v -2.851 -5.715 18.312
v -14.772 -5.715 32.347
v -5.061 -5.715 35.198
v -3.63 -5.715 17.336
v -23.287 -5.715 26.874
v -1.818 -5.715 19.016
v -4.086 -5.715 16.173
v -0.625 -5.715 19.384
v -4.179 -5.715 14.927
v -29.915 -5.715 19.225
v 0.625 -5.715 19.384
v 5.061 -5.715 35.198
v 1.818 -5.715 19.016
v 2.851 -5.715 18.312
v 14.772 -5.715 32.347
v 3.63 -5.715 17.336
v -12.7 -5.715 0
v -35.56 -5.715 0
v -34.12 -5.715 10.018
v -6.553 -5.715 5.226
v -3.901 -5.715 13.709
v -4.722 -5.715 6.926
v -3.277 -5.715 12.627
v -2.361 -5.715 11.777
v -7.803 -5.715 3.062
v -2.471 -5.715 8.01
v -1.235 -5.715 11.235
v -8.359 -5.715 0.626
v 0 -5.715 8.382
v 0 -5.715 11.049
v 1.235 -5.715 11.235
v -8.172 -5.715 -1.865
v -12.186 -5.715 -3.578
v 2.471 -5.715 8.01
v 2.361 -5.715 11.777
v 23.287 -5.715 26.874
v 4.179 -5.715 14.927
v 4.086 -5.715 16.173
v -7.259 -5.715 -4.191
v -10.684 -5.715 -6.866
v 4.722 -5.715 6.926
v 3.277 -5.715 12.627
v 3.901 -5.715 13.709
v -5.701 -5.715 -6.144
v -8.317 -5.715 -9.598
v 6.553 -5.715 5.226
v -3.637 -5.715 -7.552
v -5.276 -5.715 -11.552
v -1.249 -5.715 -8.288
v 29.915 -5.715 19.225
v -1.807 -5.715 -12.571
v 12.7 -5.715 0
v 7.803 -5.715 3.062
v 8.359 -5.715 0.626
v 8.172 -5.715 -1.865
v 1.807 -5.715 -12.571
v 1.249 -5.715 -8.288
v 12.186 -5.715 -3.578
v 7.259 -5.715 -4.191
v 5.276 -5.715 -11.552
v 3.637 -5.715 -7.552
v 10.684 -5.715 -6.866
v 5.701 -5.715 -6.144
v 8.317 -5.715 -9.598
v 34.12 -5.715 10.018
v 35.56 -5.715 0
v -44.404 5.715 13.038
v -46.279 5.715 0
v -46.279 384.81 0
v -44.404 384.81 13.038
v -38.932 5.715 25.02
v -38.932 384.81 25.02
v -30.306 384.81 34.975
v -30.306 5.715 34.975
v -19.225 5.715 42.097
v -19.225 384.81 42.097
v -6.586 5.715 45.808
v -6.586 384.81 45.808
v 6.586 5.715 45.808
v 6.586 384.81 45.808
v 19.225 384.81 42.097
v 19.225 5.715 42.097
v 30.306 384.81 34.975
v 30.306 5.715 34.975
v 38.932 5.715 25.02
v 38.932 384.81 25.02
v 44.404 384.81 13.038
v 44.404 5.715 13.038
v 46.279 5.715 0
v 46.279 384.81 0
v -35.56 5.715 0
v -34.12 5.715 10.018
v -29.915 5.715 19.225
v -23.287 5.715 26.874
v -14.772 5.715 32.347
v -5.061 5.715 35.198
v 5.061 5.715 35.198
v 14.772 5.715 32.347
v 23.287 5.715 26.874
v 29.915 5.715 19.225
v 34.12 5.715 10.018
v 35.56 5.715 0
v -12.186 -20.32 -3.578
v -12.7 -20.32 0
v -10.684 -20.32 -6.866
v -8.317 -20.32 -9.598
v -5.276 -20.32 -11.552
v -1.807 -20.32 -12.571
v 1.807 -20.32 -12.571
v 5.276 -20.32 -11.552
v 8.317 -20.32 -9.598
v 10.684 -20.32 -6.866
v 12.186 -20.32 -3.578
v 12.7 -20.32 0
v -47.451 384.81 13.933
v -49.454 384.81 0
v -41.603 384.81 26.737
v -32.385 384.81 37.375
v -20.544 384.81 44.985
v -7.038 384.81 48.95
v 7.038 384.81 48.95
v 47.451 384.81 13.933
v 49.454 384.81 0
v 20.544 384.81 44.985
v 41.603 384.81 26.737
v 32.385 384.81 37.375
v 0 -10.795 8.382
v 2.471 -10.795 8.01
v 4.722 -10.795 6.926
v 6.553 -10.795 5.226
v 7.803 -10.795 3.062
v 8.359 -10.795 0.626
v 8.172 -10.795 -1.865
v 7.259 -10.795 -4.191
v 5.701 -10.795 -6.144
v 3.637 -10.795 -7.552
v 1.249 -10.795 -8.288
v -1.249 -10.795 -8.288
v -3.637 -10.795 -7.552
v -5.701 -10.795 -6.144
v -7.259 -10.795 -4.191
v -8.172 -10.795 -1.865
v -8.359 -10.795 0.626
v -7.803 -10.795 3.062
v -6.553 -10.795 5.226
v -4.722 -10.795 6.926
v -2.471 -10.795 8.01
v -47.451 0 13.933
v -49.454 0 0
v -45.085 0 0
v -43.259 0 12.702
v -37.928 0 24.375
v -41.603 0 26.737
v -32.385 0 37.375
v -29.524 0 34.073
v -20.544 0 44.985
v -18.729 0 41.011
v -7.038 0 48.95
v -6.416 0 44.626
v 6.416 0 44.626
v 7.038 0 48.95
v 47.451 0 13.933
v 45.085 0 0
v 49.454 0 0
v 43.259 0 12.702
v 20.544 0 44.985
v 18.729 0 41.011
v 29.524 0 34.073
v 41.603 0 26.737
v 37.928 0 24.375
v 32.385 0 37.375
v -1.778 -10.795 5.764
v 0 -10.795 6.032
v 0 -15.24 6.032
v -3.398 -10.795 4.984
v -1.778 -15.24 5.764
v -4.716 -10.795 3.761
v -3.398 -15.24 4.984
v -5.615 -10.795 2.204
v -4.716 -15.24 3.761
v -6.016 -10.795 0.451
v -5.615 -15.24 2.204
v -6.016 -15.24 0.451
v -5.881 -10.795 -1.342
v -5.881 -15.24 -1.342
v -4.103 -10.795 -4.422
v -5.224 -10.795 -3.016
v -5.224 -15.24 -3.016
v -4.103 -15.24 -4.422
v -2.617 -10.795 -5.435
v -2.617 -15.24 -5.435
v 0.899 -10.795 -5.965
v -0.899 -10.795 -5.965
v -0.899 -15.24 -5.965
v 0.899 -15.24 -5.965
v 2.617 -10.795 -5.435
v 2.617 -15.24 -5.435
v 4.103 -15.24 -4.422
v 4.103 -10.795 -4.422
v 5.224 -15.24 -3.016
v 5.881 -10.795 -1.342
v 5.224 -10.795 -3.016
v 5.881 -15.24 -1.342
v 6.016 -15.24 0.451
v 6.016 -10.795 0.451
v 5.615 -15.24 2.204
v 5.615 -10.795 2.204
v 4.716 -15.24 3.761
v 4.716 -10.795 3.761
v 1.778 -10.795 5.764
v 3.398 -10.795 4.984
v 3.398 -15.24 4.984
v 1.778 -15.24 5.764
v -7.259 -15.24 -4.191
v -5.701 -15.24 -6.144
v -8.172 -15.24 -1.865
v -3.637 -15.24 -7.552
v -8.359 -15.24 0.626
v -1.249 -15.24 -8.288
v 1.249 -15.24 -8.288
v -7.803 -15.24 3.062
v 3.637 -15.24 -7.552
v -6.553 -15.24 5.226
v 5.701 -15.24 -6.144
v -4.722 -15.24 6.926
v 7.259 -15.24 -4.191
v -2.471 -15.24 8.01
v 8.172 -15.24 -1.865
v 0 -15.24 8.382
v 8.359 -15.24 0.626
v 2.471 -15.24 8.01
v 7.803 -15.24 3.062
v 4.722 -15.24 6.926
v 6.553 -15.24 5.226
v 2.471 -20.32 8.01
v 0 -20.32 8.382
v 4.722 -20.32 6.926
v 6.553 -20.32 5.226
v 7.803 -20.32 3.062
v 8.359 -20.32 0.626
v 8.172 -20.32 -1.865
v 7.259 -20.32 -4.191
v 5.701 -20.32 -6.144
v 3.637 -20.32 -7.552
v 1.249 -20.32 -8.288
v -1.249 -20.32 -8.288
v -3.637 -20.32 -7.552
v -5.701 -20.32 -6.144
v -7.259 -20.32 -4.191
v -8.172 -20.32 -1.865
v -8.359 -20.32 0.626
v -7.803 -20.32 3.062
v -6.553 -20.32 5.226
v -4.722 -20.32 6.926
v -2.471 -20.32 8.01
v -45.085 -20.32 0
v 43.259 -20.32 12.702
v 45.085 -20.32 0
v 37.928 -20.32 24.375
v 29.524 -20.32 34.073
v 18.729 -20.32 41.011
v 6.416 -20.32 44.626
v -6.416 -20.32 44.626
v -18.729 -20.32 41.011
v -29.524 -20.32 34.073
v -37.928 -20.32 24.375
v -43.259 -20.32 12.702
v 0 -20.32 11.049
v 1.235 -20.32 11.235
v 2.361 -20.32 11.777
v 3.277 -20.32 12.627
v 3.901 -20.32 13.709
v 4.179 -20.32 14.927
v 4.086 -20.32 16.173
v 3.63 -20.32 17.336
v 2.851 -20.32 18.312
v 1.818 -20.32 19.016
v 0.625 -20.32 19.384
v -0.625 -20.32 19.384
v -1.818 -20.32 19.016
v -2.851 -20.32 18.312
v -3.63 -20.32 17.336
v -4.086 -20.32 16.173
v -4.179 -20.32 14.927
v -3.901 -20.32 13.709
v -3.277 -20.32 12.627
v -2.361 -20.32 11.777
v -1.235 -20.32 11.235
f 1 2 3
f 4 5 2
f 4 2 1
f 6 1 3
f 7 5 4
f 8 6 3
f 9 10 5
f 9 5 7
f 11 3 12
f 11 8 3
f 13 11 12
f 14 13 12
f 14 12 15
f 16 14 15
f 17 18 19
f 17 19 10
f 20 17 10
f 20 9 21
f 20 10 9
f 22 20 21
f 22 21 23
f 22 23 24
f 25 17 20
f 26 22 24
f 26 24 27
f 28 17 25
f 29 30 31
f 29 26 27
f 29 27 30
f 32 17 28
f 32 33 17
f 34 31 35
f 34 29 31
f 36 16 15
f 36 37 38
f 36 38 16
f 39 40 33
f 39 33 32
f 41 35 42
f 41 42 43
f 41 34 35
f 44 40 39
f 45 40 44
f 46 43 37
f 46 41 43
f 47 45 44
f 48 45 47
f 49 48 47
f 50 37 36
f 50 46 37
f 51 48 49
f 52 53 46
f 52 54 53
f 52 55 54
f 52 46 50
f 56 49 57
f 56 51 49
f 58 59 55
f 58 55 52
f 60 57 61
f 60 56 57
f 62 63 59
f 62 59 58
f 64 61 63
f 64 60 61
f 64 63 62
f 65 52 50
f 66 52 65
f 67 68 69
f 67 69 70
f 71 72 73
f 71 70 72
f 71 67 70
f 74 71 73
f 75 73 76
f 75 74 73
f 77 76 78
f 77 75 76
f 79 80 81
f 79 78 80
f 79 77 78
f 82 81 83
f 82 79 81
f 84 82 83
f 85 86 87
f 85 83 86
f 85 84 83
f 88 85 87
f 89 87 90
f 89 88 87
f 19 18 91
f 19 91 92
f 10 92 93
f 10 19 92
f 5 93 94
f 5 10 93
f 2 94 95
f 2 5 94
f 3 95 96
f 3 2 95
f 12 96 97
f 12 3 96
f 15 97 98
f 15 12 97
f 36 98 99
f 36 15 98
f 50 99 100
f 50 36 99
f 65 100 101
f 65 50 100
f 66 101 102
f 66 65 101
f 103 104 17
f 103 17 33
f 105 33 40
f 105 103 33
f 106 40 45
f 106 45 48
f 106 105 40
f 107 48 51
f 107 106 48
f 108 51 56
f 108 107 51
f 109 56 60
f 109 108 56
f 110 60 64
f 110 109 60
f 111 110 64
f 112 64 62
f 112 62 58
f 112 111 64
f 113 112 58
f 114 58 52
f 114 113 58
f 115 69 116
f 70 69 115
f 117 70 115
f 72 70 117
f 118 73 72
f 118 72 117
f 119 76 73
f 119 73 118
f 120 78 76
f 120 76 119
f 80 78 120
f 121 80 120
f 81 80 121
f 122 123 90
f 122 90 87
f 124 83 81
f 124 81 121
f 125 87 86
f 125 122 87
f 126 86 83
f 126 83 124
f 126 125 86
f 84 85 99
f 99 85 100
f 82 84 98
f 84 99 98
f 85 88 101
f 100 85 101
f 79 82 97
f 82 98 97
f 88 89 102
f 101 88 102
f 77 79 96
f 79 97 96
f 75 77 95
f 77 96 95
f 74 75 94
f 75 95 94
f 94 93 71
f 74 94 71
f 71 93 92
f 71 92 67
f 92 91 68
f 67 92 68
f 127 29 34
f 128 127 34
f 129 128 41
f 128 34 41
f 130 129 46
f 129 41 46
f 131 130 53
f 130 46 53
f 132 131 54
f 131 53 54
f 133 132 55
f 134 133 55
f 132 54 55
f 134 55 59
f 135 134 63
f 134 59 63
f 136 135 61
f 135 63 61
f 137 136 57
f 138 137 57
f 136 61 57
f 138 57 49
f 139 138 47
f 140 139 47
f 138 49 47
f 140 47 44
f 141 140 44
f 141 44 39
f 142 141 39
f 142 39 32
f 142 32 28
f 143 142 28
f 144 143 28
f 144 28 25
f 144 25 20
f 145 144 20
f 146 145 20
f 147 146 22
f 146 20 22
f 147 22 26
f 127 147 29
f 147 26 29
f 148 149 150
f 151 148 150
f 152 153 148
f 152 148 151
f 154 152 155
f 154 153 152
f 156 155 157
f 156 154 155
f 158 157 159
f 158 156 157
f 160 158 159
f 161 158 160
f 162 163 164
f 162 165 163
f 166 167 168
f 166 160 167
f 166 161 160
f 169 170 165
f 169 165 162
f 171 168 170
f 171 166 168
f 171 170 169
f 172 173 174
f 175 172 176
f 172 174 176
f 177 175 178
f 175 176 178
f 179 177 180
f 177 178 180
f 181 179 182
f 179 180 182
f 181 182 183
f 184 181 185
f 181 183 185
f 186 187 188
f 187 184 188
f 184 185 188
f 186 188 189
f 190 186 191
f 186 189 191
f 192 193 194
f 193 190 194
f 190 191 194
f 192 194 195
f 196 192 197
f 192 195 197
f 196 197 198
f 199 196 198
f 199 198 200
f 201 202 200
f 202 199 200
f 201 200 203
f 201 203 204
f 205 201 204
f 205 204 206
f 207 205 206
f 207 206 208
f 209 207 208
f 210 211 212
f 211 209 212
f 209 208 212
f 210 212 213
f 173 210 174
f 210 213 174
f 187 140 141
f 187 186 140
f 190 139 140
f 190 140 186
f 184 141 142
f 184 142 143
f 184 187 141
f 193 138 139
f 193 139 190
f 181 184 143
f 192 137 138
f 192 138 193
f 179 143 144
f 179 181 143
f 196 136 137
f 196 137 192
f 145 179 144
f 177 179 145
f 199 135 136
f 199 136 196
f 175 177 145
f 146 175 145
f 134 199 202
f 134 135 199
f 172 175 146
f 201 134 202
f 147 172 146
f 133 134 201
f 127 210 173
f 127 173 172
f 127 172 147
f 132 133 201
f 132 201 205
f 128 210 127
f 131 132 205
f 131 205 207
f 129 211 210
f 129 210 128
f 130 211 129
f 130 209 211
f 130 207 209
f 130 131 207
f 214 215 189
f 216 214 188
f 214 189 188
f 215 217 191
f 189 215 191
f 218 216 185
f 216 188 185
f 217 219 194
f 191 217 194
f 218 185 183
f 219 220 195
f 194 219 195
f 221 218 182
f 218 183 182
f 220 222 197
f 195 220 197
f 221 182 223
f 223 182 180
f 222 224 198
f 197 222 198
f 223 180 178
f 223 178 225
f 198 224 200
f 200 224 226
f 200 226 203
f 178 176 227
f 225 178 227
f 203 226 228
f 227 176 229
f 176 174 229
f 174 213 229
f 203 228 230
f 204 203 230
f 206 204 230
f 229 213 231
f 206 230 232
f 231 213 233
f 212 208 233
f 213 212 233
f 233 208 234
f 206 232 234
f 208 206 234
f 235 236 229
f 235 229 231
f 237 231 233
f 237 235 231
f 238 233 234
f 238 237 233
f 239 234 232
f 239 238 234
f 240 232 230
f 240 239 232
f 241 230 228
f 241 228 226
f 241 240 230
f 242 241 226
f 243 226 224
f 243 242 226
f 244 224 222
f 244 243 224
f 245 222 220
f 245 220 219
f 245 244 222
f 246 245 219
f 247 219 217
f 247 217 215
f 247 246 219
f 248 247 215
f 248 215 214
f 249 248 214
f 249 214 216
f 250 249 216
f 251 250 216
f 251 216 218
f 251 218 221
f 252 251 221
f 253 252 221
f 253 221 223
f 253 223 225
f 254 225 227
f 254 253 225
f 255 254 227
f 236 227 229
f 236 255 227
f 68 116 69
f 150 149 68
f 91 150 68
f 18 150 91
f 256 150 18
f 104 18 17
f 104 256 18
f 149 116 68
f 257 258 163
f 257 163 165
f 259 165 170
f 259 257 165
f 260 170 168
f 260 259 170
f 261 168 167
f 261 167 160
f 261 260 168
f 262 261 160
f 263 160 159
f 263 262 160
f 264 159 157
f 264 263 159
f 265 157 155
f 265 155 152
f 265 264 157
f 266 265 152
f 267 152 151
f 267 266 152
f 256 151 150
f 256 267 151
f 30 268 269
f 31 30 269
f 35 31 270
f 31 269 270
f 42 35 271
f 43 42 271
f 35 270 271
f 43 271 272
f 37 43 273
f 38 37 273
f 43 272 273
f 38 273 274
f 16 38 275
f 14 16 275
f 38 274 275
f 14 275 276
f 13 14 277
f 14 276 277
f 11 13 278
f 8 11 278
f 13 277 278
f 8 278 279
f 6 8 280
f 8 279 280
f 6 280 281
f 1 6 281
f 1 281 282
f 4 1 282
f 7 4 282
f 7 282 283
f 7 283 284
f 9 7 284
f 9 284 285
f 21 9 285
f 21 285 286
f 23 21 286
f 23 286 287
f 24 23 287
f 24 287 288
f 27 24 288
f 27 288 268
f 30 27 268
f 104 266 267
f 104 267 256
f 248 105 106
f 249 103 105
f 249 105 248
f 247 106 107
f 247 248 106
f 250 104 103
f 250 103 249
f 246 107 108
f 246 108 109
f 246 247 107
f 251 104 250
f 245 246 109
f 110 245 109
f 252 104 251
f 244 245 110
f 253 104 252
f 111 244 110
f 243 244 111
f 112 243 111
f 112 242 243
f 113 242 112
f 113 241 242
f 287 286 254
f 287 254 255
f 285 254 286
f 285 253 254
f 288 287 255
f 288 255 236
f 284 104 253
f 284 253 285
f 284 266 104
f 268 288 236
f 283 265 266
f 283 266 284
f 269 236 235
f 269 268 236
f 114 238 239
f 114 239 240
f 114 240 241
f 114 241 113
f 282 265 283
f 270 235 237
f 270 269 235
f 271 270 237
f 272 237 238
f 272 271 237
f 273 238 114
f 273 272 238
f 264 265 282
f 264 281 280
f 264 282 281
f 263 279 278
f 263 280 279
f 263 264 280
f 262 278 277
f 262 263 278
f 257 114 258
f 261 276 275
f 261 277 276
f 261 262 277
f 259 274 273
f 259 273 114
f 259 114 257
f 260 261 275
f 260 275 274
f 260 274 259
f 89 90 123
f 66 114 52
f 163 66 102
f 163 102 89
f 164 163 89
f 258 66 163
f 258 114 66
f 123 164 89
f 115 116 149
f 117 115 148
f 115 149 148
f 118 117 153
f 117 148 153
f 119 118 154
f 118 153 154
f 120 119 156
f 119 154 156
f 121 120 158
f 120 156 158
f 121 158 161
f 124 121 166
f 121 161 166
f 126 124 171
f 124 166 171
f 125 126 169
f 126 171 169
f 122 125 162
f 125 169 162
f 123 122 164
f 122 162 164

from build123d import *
from build123d.topology import SkipClean

# Parameters (mm, degrees)
BOSS_EXTRUDE1_DEPTH      = 3.81
BOSS_EXTRUDE1_DEPTH_BACK = 6.35
SKETCH1_R                = 49.4538
SKETCH2_R                = 49.4538
BOSS_EXTRUDE2_DEPTH      = 381
SHELL1_T                 = -3.175
CUT_EXTRUDE1_DEPTH       = 398.363186857
BOSS_EXTRUDE3_DEPTH      = 3.81
SKETCH7_R                = 49.4538
SKETCH7_R_2              = 45.085
CUT_EXTRUDE2_DEPTH       = 6.35
BOSS_EXTRUDE4_START      = 7.62
BOSS_EXTRUDE4_DEPTH      = 7.62
SKETCH10_R               = 35.56
CUT_EXTRUDE3_DEPTH       = 6.35
SKETCH11_R               = 8.382
CUT_EXTRUDE4_DEPTH       = 5.08
SKETCH12_R               = 6.0325
CUT_EXTRUDE5_DEPTH       = 402.739558289
BOSS_EXTRUDE5_DEPTH      = 5.08
SKETCH14_R               = 4.191
CUT_EXTRUDE6_DEPTH       = 405.866453376
BOSS_EXTRUDE6_START      = 6.35
SKETCH15_R               = 4.191
SKETCH15_R_2             = 6.0325
BOSS_EXTRUDE6_DEPTH      = 6.35


with BuildPart() as part:
    # Sketch1 → Boss-Extrude1 (new, two sides: drawn at the far end of the back side and taken through both)
    with BuildSketch(Plane(origin=(0, 0, 0), x_dir=(1, 0, 0), z_dir=(0, 1, 0)).offset(-BOSS_EXTRUDE1_DEPTH_BACK)):
        Circle(SKETCH1_R)
    extrude(amount=BOSS_EXTRUDE1_DEPTH + BOSS_EXTRUDE1_DEPTH_BACK)

    # Sketch2 → Boss-Extrude2 (add)
    with BuildSketch(Plane(origin=(0, 3.81, 0), x_dir=(1, 0, 0), z_dir=(0, 1, 0))):
        Circle(SKETCH2_R)
    extrude(amount=BOSS_EXTRUDE2_DEPTH)

    # Shell1
    shell1_openings = [part.faces().sort_by_distance(p)[0] for p in [
        (0, 384.81, 0),
    ]]
    offset(amount=SHELL1_T, openings=shell1_openings, kind=Kind.INTERSECTION)

    # Sketch4 → Cut-Extrude1 (cut, through all)
    with BuildSketch(Plane.XZ.offset(6.35)):
        with BuildLine():
            Line((49.4538, 0), (12.7, 0))
            ThreePointArc((12.7, 0), (0, -12.7), (-12.7, 0))
            Line((-12.7, 0), (-49.4538, 0))
            ThreePointArc((-49.4538, 0), (0, -49.4538), (49.4538, 0))
        make_face()
    extrude(amount=-CUT_EXTRUDE1_DEPTH, mode=Mode.SUBTRACT)

    # Sketch5 → Boss-Extrude3 (add)
    with BuildSketch(Plane(origin=(0, -3.175, 0), x_dir=(1, 0, 0), z_dir=(0, 1, 0))):
        with BuildLine():
            Line((-46.2788, 0), (-12.7, 0))
            ThreePointArc((-12.7, 0), (0, 12.7), (12.7, 0))
            Line((12.7, 0), (46.2788, 0))
            ThreePointArc((46.2788, 0), (0, -46.2788), (-46.2788, 0))
        make_face()
    extrude(amount=BOSS_EXTRUDE3_DEPTH)

    # Sketch7 → Cut-Extrude2 (cut)
    with BuildSketch(Plane.XZ.offset(6.35)):
        Circle(SKETCH7_R)
        Circle(SKETCH7_R_2, mode=Mode.SUBTRACT)
    extrude(amount=-CUT_EXTRUDE2_DEPTH, mode=Mode.SUBTRACT)

    # Sketch9 → Boss-Extrude4 (add)
    with SkipClean():  # the faces are left unmerged after this step: merging them gives an invalid solid
        with BuildSketch(Plane.XZ.offset(6.35).offset(BOSS_EXTRUDE4_START)):
            with BuildLine():
                Line((45.085, 0), (12.7, 0))
                ThreePointArc((12.7, 0), (0, -12.7), (-12.7, 0))
                Line((-12.7, 0), (-45.085, 0))
                ThreePointArc((-45.085, 0), (0, 45.085), (45.085, 0))
            make_face()
        extrude(amount=-BOSS_EXTRUDE4_DEPTH)
    add(part.part.scale(1), mode=Mode.REPLACE)  # the faces are merged on a copy

    # Sketch10 → Cut-Extrude3 (cut)
    with BuildSketch(Plane(origin=(0, 0.635, 0), x_dir=(1, 0, 0), z_dir=(0, 1, 0))):
        Circle(SKETCH10_R)
    extrude(amount=-CUT_EXTRUDE3_DEPTH, mode=Mode.SUBTRACT)

    # Sketch11 → Cut-Extrude4 (cut)
    with BuildSketch(Plane(origin=(0, -5.715, 0), x_dir=(1, 0, 0), z_dir=(0, 1, 0))):
        Circle(SKETCH11_R)
    cut_extrude4 = extrude(amount=-CUT_EXTRUDE4_DEPTH, mode=Mode.SUBTRACT)

    # Sketch12 → Cut-Extrude5 (cut, through all)
    with BuildSketch(Plane(origin=(0, -10.795, 0), x_dir=(1, 0, 0), z_dir=(0, 1, 0))):
        Circle(SKETCH12_R)
    extrude(amount=-CUT_EXTRUDE5_DEPTH, mode=Mode.SUBTRACT)

    # Sketch13 → Boss-Extrude5 (add)
    with SkipClean():  # the faces are left unmerged after this step: merging them gives an invalid solid
        with BuildSketch(Plane(origin=(0, 0.635, 0), x_dir=(1, 0, 0), z_dir=(0, 1, 0))):
            with BuildLine():
                Line((-46.2788, 0), (-35.56, 0))
                ThreePointArc((-35.56, 0), (0, -35.56), (35.56, 0))
                Line((35.56, 0), (46.2788, 0))
                ThreePointArc((46.2788, 0), (0, -46.2788), (-46.2788, 0))
            make_face()
        extrude(amount=BOSS_EXTRUDE5_DEPTH)
    add(part.part.scale(1), mode=Mode.REPLACE)  # the faces are merged on a copy

    # Sketch14 → Cut-Extrude6 (cut, through all)
    with BuildSketch(Plane.XZ.offset(13.97)):
        with Locations((0, 15.24)):
            Circle(SKETCH14_R)
    extrude(amount=-CUT_EXTRUDE6_DEPTH, mode=Mode.SUBTRACT)

    # Sketch15 → Boss-Extrude6 (add)
    with BuildSketch(Plane.XZ.offset(13.97).offset(BOSS_EXTRUDE6_START)):
        with BuildLine():
            Line((12.7, 0), (45.085, 0))
            ThreePointArc((45.085, 0), (0, 45.085), (-45.085, 0))
            Line((-45.085, 0), (-12.7, 0))
            ThreePointArc((-12.7, 0), (0, -12.7), (12.7, 0))
        make_face()
        with Locations((0, 15.24)):
            Circle(SKETCH15_R, mode=Mode.SUBTRACT)
        Circle(SKETCH15_R_2, mode=Mode.SUBTRACT)
    extrude(amount=-BOSS_EXTRUDE6_DEPTH)

    # Mirror2: Cut-Extrude4 across plane
    add(cut_extrude4.mirror(Plane(origin=(0, -13.0175, 0), x_dir=(0, 0, 1), z_dir=(0, -1, 0))), mode=Mode.SUBTRACT)


solid = part.part
